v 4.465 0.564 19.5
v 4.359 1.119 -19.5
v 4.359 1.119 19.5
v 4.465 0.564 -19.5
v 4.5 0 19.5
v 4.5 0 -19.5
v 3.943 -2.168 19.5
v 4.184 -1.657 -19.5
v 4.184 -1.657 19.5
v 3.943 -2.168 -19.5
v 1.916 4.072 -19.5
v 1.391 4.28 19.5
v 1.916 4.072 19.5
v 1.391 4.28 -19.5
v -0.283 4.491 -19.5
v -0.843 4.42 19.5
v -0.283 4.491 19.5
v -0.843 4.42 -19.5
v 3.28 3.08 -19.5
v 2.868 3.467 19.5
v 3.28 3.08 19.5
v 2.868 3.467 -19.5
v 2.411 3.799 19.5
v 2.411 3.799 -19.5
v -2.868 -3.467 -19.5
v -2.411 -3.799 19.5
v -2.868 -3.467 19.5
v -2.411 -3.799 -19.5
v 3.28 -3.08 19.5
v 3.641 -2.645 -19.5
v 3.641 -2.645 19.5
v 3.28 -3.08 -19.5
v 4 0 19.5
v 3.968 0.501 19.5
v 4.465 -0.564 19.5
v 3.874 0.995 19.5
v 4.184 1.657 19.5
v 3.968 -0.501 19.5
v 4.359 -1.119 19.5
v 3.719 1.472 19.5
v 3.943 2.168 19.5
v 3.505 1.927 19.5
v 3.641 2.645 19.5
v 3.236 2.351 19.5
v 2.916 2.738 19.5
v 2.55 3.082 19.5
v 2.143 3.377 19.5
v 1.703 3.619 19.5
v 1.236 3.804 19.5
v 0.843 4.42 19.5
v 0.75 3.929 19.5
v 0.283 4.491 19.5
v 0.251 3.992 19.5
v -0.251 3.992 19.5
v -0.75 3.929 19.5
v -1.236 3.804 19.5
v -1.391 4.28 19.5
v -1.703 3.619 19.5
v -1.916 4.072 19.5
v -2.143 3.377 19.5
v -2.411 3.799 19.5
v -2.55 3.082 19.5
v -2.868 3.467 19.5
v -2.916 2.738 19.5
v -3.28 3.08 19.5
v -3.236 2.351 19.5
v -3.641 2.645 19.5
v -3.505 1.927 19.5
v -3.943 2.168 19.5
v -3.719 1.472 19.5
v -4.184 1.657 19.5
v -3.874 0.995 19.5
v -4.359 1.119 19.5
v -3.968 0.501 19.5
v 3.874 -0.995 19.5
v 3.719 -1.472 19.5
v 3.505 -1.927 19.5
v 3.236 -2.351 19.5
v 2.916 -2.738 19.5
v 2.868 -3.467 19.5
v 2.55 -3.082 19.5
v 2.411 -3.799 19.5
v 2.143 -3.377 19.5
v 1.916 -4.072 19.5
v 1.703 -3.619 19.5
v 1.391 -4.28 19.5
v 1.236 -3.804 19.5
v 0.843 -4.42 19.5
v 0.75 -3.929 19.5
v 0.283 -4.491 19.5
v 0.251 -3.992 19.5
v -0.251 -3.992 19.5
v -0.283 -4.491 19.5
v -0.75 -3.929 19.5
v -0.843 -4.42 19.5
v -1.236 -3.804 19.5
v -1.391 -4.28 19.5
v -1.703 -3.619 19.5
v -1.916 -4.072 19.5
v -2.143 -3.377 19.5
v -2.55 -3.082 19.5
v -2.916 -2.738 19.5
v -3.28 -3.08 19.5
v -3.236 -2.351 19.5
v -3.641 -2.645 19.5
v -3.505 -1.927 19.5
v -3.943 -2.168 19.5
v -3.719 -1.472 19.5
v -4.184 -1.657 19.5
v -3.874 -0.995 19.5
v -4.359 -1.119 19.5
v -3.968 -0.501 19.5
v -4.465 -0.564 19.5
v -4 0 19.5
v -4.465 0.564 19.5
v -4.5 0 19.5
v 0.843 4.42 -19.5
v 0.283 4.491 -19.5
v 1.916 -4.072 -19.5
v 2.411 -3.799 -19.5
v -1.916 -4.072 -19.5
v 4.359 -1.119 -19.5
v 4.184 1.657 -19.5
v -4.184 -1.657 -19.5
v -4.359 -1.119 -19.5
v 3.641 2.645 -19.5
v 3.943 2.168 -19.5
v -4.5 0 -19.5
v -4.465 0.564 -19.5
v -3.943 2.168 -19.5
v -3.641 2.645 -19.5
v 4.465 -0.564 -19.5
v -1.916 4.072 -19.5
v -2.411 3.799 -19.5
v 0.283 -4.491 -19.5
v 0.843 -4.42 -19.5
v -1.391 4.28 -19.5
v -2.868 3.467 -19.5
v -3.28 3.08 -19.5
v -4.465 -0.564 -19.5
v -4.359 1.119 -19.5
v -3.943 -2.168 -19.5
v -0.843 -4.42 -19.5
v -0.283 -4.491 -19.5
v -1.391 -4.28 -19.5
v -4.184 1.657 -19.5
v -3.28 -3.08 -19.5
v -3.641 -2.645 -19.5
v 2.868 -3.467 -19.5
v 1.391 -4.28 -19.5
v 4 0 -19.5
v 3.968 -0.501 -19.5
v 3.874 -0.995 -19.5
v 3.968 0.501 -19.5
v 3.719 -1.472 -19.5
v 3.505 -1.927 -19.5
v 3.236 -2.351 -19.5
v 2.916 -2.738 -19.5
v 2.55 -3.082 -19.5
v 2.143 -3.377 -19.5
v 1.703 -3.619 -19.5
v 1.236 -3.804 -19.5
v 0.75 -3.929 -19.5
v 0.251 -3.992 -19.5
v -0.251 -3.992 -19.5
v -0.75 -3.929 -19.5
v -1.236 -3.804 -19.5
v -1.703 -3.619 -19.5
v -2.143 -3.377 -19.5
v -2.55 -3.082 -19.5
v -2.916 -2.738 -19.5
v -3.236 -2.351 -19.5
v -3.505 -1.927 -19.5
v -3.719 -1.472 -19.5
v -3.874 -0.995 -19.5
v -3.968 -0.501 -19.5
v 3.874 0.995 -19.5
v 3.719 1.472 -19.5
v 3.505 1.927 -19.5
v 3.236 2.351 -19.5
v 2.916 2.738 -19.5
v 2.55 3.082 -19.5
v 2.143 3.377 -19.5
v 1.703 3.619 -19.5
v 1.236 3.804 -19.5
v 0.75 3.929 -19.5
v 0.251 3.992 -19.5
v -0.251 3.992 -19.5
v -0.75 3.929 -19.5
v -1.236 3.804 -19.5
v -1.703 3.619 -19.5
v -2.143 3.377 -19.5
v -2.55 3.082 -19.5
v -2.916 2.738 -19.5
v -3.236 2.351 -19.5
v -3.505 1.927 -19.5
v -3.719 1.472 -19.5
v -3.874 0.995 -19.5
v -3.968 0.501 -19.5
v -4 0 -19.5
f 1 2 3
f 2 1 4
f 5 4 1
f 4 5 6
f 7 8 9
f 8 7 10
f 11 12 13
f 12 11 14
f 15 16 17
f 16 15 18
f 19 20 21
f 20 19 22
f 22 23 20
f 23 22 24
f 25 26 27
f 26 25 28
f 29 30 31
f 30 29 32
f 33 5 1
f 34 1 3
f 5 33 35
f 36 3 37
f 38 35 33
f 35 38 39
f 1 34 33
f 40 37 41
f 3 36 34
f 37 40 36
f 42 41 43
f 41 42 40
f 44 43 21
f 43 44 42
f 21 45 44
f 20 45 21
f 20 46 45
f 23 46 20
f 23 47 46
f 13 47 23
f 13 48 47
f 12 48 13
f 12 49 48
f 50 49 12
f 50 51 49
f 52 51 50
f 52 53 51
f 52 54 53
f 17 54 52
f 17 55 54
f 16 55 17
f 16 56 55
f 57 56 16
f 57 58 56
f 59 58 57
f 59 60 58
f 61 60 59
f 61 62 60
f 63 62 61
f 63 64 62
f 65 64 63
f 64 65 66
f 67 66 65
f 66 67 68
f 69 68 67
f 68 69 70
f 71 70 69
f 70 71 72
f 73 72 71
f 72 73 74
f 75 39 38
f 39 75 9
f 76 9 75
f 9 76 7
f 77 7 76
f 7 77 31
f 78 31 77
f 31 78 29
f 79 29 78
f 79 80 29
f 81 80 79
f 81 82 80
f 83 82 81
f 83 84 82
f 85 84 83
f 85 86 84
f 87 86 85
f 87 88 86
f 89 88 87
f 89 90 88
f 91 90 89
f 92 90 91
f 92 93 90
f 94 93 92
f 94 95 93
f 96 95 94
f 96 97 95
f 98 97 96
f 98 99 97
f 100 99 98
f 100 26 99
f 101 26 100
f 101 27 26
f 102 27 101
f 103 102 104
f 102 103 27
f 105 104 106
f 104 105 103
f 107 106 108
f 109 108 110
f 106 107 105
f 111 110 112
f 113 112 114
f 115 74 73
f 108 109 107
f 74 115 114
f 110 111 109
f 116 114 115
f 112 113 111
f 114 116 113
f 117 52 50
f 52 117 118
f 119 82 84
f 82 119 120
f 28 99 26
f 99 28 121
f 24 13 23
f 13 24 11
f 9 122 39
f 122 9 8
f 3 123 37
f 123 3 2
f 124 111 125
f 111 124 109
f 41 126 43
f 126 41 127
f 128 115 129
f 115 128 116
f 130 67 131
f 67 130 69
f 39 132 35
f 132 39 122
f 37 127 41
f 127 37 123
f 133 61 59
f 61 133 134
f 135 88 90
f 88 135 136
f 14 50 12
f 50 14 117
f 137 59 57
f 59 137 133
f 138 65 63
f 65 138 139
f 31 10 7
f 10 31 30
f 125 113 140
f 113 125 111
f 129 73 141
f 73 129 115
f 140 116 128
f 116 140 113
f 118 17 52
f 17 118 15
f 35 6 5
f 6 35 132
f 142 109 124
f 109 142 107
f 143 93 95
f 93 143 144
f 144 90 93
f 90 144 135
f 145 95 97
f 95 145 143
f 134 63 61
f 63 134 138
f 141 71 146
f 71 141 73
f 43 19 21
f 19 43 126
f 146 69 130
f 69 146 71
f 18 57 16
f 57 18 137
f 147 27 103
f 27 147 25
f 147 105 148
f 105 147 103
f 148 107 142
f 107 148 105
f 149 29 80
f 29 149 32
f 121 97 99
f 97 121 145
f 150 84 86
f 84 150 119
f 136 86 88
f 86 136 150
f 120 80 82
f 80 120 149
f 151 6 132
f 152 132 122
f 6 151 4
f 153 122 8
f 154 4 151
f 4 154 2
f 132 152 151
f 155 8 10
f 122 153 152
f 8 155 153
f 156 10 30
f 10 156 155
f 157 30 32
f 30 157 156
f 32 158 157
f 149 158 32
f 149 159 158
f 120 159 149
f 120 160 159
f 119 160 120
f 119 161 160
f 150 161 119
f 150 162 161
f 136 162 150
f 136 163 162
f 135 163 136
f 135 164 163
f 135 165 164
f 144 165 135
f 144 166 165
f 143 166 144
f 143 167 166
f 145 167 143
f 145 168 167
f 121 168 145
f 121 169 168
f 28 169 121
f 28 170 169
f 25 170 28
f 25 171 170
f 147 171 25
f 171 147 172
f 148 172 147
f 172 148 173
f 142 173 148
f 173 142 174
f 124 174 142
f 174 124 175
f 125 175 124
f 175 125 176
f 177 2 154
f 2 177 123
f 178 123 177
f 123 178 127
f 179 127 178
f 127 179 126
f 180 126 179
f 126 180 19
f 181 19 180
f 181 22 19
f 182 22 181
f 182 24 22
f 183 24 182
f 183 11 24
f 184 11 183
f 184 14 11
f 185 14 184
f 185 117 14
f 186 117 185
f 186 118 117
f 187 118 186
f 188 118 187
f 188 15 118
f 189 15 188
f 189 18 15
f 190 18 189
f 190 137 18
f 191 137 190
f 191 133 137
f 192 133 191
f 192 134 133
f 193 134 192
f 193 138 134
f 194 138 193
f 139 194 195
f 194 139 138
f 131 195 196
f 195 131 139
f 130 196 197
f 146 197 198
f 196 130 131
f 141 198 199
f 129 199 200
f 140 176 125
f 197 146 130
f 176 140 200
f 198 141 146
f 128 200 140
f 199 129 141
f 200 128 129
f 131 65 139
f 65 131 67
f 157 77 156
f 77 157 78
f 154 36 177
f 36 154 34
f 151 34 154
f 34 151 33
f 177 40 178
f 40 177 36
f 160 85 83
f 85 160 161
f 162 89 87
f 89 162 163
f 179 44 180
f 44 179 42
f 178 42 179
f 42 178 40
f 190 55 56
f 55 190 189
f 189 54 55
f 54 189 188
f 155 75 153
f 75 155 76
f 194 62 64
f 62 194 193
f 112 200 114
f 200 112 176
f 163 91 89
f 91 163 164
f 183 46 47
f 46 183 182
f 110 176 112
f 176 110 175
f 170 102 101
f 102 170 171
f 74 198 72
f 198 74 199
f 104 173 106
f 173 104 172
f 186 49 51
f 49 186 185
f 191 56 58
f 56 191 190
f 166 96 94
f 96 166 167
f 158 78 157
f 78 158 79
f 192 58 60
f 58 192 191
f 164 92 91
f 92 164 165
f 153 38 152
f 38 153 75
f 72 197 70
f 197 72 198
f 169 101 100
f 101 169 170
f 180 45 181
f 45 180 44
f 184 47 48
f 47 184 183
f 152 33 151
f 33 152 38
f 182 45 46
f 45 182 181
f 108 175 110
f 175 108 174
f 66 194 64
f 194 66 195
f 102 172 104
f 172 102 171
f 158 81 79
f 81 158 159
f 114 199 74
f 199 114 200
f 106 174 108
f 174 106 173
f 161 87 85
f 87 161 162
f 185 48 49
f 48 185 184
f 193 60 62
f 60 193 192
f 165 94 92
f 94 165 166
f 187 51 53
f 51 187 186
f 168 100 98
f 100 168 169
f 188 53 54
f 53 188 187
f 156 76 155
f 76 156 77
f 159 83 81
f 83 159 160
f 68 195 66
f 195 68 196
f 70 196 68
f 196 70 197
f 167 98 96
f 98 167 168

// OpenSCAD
$fn = 50;


difference() {
	union() {
		translate(v = [0, 0, -19.5000000000]) {
			cylinder(h = 39, r = 4.5000000000);
		}
	}
	union() {
		translate(v = [0, 0, -100.0000000000]) {
			cylinder(h = 200, r = 4.0000000000);
		}
	}
}
